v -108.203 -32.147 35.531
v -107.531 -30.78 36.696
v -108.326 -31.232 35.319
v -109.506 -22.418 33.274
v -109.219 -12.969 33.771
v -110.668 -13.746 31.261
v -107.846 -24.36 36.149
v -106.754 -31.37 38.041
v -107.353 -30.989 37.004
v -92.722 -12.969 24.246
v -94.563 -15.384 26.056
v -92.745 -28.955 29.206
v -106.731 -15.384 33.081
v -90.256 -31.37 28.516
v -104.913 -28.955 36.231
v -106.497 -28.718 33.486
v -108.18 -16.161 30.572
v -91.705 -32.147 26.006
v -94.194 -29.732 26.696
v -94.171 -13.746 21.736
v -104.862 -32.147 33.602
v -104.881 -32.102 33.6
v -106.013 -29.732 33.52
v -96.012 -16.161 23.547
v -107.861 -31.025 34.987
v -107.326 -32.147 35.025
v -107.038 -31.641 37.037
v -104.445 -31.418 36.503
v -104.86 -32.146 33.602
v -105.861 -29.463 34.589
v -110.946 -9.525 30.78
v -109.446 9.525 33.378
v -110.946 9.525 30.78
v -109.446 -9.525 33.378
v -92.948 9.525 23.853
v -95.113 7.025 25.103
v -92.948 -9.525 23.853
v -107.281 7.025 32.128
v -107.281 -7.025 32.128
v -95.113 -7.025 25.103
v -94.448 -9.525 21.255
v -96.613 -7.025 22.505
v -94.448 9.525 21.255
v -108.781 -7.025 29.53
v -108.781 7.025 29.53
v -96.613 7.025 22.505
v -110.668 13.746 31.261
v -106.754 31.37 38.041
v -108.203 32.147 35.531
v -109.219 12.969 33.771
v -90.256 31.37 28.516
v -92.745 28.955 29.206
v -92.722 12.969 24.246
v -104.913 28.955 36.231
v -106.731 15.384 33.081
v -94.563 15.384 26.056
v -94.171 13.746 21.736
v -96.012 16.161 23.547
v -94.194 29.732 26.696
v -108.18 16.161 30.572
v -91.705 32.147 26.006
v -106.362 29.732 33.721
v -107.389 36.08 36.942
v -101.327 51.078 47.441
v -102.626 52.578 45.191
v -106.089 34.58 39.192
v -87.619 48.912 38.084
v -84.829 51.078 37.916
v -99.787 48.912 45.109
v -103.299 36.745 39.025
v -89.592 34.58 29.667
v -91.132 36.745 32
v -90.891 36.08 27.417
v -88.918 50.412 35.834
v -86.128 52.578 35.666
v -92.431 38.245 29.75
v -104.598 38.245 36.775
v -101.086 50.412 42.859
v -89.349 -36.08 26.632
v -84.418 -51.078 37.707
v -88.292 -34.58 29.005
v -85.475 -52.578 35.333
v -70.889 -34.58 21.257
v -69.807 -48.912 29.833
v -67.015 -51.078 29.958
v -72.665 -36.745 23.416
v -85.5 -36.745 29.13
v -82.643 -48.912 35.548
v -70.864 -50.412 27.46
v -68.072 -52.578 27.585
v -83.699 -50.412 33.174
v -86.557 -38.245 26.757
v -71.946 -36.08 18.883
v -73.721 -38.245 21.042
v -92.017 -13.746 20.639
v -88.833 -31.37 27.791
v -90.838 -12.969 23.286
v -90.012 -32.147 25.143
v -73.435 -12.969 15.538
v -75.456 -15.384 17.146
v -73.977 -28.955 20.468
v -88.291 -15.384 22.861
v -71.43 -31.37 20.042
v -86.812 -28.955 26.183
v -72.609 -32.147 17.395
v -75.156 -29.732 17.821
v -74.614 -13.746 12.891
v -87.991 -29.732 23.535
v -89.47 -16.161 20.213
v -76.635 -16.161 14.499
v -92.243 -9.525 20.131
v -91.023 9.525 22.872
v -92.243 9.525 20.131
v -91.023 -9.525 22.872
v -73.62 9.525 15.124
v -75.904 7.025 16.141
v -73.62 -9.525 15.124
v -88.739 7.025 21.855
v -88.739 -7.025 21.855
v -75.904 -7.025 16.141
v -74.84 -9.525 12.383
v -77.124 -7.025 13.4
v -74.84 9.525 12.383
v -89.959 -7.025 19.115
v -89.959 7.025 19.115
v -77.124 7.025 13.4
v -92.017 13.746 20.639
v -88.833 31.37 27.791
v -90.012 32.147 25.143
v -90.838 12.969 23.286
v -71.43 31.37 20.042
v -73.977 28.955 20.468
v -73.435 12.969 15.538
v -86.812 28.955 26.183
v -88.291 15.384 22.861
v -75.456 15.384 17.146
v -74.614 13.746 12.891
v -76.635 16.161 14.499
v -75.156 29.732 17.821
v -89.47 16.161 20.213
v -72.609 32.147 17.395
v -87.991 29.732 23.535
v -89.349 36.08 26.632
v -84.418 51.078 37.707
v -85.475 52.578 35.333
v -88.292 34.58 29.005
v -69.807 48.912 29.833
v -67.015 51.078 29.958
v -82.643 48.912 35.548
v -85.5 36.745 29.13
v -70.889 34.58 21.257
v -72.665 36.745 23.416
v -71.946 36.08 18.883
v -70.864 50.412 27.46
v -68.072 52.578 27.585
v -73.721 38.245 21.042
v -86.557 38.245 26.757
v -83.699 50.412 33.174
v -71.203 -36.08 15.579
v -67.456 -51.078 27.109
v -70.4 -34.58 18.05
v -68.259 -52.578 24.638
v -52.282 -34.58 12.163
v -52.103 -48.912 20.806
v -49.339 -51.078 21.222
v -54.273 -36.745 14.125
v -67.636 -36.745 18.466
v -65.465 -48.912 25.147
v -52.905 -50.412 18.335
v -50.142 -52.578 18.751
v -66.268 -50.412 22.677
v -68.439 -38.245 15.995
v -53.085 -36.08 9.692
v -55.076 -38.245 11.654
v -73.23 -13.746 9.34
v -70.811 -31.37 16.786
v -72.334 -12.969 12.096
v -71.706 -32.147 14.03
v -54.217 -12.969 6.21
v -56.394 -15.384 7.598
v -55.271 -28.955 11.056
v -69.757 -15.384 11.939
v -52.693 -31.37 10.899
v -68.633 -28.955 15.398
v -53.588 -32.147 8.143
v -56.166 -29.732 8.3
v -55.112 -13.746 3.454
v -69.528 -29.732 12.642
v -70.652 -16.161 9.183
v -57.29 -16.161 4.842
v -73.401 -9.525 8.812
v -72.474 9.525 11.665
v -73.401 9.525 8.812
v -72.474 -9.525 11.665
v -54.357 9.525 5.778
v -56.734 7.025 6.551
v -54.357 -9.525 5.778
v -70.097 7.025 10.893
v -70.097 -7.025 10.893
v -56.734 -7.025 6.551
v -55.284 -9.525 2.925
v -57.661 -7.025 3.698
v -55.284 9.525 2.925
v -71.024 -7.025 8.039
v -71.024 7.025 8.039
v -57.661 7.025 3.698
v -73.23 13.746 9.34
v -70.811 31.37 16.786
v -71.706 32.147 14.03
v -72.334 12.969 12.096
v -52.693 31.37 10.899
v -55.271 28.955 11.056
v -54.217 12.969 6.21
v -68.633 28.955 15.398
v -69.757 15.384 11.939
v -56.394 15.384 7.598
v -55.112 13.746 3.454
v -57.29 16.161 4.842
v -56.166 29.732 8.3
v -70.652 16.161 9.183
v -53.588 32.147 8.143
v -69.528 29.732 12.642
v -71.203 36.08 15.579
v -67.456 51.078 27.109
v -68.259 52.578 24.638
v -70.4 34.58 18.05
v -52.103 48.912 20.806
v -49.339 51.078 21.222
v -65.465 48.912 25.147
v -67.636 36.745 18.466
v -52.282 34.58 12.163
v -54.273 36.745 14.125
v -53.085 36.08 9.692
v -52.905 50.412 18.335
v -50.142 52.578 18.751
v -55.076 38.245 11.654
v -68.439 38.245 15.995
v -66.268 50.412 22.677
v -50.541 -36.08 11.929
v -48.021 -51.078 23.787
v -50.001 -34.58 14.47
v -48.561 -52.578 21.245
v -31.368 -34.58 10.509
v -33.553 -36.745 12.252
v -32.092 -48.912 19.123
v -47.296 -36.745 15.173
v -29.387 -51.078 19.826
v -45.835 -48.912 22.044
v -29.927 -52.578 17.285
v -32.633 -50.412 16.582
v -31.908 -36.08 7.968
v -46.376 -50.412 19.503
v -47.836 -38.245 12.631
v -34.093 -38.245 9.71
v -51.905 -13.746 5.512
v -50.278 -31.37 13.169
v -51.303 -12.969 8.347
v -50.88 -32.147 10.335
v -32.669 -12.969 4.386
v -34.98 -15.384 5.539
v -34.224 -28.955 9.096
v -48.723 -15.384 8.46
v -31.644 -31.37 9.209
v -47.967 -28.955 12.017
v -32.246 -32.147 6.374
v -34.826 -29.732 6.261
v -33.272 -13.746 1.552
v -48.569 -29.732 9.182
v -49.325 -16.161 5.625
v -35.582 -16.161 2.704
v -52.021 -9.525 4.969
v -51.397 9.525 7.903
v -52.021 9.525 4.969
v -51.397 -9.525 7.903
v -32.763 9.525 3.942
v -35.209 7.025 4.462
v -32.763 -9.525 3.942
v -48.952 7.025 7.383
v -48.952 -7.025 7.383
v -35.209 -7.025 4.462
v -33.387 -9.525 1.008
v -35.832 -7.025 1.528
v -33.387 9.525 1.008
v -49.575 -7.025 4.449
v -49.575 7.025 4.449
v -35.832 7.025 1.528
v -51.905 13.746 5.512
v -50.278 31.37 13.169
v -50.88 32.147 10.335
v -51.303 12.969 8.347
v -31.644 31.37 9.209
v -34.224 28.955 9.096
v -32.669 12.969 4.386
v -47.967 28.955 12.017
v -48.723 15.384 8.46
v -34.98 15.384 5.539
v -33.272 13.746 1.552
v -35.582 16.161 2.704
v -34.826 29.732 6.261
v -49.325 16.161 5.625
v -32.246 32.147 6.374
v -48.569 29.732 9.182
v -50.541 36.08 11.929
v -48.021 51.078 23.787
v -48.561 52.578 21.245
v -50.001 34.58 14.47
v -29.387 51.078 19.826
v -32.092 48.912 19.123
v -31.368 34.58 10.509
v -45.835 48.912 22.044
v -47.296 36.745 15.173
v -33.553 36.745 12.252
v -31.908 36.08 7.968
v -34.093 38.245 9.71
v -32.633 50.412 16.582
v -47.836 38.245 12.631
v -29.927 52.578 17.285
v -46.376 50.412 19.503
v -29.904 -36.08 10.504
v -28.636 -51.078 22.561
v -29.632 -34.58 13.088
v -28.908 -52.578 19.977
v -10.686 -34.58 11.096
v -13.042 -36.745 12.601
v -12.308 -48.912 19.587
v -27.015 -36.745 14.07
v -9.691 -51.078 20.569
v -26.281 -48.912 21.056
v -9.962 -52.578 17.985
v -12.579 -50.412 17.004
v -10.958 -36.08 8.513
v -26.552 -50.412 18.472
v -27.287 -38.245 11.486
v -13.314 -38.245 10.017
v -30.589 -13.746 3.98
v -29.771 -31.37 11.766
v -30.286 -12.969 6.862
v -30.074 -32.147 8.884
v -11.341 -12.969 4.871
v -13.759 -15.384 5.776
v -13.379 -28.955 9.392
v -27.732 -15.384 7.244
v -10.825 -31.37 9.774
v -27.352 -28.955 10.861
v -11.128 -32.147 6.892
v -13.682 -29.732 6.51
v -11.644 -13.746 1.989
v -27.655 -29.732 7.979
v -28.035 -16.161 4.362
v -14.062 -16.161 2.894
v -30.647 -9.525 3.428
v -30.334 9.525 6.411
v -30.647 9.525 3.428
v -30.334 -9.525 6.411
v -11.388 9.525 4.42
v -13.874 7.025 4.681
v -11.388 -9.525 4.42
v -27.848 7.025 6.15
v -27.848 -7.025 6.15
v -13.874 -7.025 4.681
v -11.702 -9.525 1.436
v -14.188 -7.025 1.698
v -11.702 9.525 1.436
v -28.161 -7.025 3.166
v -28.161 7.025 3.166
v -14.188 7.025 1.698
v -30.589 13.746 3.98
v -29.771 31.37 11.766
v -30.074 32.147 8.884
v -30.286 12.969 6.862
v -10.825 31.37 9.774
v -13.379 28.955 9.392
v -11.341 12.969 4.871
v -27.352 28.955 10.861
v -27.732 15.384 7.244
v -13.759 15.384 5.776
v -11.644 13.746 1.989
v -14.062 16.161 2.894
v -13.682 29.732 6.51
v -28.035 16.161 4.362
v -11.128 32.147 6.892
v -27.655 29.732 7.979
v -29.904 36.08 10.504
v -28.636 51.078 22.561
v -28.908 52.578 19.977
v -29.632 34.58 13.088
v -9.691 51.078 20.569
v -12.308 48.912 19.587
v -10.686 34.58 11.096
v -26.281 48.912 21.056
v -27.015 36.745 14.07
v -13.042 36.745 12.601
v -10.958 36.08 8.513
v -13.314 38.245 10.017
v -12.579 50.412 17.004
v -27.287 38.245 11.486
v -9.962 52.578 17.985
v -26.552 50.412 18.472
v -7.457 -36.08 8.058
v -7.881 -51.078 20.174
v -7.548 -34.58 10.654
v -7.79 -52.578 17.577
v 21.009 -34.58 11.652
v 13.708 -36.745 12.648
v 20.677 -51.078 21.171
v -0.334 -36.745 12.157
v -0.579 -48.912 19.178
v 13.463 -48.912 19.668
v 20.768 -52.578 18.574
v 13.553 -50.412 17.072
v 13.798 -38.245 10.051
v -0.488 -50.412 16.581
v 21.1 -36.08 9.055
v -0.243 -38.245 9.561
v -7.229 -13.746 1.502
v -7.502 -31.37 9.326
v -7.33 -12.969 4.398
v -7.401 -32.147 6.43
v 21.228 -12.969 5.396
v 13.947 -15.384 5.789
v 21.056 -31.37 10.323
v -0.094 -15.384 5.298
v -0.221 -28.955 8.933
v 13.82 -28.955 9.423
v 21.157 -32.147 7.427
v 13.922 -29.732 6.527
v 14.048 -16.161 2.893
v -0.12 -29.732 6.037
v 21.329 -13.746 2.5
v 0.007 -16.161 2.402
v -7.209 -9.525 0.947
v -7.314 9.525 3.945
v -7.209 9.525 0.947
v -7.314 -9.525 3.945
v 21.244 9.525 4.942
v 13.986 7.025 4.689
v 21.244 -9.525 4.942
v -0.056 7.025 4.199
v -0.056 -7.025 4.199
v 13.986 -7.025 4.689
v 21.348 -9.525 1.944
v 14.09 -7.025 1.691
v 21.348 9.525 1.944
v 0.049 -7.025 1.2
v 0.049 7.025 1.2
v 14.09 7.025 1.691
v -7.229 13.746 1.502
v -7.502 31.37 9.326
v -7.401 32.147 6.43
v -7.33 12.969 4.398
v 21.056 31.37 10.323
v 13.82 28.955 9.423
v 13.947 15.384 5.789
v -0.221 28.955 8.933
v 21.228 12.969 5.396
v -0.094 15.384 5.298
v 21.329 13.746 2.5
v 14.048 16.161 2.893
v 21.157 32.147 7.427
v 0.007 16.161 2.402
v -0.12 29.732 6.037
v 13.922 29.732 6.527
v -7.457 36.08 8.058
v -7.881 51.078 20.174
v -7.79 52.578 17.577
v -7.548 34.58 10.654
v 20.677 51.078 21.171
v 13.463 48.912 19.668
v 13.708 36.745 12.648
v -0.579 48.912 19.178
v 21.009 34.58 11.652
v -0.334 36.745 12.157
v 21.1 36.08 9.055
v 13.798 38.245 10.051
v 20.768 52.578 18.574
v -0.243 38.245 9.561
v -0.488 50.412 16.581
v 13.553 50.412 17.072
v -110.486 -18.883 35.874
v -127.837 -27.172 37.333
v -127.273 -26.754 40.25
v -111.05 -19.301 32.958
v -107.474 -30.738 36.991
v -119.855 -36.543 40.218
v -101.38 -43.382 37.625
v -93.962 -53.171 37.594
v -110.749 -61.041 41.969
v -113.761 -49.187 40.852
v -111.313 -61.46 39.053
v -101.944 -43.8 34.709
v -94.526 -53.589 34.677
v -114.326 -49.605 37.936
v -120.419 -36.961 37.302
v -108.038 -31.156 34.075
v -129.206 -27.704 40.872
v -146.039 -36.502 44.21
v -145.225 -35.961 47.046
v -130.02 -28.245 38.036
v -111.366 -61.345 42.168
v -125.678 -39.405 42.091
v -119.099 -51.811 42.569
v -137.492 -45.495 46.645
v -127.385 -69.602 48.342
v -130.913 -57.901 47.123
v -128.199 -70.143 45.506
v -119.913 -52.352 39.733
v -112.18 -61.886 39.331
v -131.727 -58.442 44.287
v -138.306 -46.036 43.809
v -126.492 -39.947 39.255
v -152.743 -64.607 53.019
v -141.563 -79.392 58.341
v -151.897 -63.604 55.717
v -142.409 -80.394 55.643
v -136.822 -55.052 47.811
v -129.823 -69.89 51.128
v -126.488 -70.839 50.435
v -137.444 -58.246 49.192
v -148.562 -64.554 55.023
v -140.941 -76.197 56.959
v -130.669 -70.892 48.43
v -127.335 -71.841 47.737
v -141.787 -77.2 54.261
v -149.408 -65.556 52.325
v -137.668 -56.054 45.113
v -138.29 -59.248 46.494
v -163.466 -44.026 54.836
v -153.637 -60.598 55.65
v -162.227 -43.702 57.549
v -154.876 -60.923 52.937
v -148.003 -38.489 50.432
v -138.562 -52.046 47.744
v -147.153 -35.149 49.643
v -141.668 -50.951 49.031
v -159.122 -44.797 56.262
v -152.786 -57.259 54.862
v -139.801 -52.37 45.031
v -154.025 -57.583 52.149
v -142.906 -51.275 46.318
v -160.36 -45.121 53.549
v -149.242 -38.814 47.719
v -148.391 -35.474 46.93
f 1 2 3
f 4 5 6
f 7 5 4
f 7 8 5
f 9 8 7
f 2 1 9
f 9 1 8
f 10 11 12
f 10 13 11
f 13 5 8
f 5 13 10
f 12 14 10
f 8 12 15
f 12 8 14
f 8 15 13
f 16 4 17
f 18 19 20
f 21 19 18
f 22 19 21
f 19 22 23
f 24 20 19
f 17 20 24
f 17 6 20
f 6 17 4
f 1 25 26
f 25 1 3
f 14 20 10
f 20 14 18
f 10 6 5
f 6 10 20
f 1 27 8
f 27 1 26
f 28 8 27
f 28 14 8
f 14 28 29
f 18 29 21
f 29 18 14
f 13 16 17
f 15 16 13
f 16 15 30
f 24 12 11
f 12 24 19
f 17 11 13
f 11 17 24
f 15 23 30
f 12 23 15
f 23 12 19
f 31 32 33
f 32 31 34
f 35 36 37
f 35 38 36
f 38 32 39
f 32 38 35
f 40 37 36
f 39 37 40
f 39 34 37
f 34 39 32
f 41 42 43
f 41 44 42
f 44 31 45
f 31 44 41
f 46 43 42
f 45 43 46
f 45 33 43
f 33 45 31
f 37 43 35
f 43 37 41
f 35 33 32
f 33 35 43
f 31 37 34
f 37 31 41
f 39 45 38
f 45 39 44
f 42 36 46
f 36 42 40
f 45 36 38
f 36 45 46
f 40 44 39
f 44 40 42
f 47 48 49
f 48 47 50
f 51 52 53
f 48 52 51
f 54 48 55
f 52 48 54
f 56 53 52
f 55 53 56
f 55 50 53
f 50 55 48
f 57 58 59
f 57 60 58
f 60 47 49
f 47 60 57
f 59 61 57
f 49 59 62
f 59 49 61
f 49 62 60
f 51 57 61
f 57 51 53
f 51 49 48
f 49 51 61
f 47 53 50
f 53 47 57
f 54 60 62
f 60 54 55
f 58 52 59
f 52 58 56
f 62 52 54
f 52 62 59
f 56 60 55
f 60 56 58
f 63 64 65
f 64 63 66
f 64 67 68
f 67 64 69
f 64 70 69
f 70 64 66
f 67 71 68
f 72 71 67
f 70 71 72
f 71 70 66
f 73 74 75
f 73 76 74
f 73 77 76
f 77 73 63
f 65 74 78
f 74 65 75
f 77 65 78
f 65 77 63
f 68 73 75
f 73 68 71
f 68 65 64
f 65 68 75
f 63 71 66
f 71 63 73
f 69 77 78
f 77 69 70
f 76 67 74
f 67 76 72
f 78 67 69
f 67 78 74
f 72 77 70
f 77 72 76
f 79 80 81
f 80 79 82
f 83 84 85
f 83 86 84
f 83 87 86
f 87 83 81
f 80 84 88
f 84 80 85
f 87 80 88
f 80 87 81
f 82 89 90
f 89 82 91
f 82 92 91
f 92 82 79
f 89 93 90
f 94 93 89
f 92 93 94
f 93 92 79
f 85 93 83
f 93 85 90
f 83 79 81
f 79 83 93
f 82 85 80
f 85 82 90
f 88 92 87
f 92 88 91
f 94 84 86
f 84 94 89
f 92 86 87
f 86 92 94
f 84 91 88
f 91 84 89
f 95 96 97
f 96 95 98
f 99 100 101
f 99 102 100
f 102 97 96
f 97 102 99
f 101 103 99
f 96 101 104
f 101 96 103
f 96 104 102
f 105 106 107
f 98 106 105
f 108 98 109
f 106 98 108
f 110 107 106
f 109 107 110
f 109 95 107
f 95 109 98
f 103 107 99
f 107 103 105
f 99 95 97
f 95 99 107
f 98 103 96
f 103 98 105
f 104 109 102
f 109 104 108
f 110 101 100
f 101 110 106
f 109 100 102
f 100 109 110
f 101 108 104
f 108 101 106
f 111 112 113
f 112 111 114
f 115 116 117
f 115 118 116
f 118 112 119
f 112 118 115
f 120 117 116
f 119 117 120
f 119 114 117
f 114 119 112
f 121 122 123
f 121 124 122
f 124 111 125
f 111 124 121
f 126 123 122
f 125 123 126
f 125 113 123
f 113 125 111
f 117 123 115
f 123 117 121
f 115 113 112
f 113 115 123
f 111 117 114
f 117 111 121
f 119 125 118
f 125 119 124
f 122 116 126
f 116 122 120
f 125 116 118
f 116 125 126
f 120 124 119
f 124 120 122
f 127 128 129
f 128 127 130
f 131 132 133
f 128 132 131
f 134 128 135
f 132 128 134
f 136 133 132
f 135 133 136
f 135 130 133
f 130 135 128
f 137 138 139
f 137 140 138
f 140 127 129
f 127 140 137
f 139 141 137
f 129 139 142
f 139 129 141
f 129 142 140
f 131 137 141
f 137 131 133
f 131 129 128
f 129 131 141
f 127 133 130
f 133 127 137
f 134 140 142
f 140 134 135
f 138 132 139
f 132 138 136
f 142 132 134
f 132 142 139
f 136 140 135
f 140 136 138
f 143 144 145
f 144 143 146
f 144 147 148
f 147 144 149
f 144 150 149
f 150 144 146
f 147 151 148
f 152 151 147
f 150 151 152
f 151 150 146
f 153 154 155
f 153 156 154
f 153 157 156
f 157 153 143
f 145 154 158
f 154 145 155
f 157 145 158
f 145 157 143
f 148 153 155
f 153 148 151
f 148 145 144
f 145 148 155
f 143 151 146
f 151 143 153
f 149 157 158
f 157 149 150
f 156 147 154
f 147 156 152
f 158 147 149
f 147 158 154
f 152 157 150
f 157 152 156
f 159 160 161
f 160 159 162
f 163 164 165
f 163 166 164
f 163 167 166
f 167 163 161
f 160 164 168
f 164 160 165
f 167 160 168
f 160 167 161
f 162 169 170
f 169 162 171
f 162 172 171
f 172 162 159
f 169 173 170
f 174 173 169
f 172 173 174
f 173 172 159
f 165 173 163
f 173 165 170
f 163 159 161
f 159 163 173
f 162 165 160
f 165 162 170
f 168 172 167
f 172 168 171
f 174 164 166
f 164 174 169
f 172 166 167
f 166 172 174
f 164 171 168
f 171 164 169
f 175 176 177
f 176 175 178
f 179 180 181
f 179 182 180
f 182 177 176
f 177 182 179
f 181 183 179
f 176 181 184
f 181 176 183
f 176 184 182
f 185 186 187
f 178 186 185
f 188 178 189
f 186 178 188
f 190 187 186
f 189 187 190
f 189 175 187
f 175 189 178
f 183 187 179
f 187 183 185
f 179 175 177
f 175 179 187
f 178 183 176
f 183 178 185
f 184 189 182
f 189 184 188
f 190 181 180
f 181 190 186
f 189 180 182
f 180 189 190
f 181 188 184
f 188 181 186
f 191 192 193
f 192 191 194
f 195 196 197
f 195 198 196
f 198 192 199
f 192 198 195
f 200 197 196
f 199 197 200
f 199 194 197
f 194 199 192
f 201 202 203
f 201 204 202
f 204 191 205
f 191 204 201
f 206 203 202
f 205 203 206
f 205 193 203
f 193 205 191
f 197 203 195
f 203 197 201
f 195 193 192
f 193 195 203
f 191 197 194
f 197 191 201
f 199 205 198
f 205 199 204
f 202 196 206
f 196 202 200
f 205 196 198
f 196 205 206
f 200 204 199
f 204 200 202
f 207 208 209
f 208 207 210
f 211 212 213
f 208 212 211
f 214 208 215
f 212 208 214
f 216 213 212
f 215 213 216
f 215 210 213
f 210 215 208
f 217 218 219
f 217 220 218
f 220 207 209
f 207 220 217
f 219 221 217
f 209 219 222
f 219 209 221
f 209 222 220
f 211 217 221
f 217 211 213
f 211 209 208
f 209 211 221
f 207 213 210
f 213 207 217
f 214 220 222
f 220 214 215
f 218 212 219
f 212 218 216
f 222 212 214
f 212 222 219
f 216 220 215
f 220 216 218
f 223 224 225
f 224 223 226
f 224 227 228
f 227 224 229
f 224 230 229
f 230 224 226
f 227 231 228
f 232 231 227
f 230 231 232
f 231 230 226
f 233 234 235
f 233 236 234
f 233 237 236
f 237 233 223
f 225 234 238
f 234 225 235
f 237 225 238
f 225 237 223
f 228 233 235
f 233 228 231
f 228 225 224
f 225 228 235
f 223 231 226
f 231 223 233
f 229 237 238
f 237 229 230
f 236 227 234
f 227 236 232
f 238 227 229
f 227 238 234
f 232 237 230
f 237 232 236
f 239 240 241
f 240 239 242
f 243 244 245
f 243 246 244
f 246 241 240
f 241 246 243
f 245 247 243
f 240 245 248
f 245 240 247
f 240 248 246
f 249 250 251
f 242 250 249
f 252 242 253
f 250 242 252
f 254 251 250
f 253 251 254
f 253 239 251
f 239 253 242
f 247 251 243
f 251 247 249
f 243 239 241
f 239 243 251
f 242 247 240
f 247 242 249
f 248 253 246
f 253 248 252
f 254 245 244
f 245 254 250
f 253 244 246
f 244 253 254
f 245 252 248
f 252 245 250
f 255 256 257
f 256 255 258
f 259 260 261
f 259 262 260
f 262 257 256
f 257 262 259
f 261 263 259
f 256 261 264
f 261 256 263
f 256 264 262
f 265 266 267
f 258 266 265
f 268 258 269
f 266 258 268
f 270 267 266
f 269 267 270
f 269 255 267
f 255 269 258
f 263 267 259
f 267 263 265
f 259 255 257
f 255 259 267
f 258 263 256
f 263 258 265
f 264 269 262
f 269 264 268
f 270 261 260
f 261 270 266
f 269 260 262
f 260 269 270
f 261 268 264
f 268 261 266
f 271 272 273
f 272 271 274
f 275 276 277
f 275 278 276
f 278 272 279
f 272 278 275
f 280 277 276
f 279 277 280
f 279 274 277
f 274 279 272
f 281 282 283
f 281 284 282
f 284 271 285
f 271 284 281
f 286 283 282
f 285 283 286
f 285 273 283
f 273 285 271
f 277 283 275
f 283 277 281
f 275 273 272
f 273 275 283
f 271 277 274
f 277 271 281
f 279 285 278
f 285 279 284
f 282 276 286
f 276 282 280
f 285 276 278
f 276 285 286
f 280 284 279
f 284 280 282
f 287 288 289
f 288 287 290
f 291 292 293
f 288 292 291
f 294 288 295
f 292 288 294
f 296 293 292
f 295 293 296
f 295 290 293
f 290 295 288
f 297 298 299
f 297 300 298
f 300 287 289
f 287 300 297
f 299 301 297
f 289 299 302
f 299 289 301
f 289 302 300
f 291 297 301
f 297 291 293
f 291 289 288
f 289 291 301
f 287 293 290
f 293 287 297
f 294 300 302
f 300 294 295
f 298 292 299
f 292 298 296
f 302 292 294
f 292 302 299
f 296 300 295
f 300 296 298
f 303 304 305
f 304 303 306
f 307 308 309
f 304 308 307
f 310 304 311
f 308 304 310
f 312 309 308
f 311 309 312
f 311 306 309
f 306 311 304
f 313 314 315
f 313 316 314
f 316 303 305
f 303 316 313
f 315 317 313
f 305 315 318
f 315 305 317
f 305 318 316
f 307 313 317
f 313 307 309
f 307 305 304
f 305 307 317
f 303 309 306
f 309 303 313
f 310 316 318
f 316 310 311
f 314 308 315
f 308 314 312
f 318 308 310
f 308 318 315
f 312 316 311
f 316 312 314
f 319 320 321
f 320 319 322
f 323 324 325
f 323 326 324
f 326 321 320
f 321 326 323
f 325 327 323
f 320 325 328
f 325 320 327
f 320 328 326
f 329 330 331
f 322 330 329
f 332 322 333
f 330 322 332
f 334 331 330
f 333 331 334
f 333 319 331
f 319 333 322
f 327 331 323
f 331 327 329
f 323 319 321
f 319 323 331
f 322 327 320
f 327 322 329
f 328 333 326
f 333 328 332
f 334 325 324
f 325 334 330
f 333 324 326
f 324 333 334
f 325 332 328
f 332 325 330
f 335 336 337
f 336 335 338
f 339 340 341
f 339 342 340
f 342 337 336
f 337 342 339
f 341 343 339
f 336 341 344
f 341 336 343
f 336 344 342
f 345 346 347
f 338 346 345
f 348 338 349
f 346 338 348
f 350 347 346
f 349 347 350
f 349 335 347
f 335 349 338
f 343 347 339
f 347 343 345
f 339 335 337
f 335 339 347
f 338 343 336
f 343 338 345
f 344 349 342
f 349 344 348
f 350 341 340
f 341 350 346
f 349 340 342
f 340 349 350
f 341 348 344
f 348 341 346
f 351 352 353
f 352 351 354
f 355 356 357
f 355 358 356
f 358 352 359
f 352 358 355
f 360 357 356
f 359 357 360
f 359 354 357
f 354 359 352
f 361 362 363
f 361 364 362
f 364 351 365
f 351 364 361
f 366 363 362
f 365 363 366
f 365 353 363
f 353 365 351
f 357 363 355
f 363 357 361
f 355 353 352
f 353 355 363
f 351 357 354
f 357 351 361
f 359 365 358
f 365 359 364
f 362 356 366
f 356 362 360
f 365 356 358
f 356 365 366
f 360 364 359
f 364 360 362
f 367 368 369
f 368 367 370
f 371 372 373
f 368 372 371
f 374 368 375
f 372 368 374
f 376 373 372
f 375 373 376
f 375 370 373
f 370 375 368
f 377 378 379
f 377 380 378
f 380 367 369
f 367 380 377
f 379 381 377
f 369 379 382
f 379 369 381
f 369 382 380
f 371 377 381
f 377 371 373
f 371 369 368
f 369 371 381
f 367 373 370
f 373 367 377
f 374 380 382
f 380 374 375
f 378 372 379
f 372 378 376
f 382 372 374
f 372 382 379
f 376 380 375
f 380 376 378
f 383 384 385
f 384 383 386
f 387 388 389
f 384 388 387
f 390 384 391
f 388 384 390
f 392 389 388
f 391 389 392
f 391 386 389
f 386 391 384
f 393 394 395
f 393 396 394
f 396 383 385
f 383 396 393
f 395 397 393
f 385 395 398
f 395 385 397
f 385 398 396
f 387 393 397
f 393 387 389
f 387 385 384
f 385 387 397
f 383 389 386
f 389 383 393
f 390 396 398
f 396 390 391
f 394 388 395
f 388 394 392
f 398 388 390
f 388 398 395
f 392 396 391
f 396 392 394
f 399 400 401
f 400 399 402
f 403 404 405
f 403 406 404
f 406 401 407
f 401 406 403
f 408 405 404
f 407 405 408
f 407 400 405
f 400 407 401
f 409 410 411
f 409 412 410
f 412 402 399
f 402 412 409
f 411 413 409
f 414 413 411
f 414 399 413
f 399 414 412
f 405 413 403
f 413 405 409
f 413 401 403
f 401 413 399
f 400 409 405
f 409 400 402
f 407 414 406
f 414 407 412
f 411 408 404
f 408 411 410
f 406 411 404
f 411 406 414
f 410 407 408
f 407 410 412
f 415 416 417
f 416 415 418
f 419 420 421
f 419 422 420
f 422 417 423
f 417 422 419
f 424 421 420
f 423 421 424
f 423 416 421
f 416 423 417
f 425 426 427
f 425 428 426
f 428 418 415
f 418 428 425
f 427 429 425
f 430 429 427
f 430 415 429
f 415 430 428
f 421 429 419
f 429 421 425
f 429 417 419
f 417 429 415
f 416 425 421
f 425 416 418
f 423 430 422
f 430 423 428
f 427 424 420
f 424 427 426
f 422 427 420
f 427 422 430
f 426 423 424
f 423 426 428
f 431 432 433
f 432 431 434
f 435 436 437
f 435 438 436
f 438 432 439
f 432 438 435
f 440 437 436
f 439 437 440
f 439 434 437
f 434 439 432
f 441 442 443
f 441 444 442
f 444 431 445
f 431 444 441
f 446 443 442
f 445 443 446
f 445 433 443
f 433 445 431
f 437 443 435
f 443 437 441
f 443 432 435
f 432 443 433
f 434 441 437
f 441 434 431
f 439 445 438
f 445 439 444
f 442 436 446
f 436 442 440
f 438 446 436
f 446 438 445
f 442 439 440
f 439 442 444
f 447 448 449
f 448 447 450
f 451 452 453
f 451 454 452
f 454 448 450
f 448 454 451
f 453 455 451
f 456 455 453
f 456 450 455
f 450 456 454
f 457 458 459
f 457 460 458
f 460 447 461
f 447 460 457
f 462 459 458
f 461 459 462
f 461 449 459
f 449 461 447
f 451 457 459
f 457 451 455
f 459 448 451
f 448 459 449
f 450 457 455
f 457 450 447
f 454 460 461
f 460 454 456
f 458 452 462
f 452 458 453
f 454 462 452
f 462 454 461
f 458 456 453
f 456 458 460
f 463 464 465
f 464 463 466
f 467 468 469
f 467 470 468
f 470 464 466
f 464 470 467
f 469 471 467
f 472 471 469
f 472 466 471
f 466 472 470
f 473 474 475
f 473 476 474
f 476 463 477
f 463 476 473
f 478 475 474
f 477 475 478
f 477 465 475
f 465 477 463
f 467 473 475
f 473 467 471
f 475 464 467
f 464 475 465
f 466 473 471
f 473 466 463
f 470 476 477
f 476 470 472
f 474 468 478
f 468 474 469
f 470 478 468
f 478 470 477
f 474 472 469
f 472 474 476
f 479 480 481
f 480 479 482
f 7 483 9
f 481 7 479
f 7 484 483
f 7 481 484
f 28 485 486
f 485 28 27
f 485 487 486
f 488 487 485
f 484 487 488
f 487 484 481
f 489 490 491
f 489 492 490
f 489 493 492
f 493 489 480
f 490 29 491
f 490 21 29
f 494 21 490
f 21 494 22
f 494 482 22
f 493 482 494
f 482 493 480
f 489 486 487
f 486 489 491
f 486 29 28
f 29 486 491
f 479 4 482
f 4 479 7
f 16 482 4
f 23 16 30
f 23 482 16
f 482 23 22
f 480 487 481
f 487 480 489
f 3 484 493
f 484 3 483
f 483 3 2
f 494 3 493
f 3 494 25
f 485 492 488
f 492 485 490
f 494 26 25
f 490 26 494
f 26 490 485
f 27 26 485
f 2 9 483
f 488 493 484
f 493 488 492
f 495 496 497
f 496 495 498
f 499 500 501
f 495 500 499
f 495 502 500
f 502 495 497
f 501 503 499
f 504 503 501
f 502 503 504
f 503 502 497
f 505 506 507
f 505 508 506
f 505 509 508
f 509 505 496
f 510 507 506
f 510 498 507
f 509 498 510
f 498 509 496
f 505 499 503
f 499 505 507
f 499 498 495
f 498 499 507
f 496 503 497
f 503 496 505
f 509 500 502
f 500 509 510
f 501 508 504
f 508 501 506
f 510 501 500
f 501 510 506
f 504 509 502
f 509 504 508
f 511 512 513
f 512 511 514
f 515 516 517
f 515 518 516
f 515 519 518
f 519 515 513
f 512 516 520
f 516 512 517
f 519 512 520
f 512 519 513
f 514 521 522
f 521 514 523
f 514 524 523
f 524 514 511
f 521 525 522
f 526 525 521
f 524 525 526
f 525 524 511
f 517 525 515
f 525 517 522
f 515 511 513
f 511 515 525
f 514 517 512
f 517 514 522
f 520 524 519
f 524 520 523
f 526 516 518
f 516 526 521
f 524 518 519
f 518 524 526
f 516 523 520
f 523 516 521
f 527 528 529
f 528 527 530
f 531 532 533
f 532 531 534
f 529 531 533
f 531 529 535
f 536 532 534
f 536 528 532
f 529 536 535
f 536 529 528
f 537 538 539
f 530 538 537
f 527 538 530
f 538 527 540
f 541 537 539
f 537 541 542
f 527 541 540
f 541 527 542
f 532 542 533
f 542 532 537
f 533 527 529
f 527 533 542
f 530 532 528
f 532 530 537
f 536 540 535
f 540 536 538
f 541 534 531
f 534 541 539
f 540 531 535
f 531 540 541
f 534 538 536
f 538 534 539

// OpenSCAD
//this thing is a shitshow, I just want to say

// globals

right = true;
cols = 5;
rows = 4;

// constants
unit = 19.05;
// row rotation angle. determines how much each row rotates compared to the last
alpha = 15;
// column rotation angle. you guessed it
beta = 6;

// I assume, the height of a key
key_height = 12.5;
hole_height = 7;
plate_height = 5.75;

// these are measurements for the actual keyswitch plates - the squares we position to accept a keyswitch
keyswitch_height = 19;
keyswitch_width = 19;

pillar_height = hole_height + plate_height / 2;
pillar_depth = keyswitch_height;
pillar_width = keyswitch_width;

full_height = pillar_height + key_height;

row_radius = (pillar_depth / 2) / (sin(alpha / 2)) + full_height-8;
column_radius = (pillar_width / 2) / (sin(beta / 2)) + full_height;

// start key place

//array of column angle insets (extra z distance for each column)
column_insets = [
   0,
   0,
   -254/90,
   0,
  254/90,
  254/90,
  254/90,
  254/90,
  254/90
];

// multiple use functions

module row_placed_shape(row,row_radius){
    translate([0, 0, row_radius])
    rotate([alpha * (row), 0, 0])
    translate([0, 0, -row_radius])

    children();
}

module column_placed_shape(column, column_radius, column_inset){
  //column_angle = beta * (5 - column);
  column_angle = (beta * (column - 5) + (column == cols ? 2 : 0));

  translate([0, 0, column_radius])
  rotate([0, column_angle, 0])
  translate([0, 0, -column_radius])
  translate([0,0,column_inset])
  children();
}

module key_place(column, row){
  column_inset = column_insets[column];

  column_placed_shape(column, column_radius, column_inset){
    row_placed_shape(row - 2, row_radius){
        children();
    }
  }
}

//end key place

// bounding box. also helps shape the case
module limits(){
  difference(){
    cube([1000,1000,1000], center = true);
    children();
  }
}

module switch_cutout(units=1){
  difference(){
    cube([unit*units,unit,3], center = true);
    cube([14.05,14.05,14], center = true);
  }
}

module hand_array_plate(){
  for (column = [0 : cols]){
    for (row = [0 : rows]){
      key_place(column,row){
        if (column == cols){
          switch_cutout(1.5);
        } else if (!(column == 0 && row == 0)){
          switch_cutout(1);
        }
      }
    }
  }
}

module hand_array_base(){
  for (column = [0 : cols]){
    for (row = [0 : rows]){
      key_place(column,row){
        if (column == cols){
          switch_pillar(1.5);
        }
        else if (column != 0 || row != rows){
          switch_pillar(1);
        }
      }
    }
  }
}

//large pillar-like structure put underneath each switch to make a base
module switch_pillar(units=1, scle = 3, extrax = 2.95, extray = 5.75){
  z = 100;
  linear_extrude(height = z, scale = scle){
    unit = 19.05;
    square([(unit + extrax) * units,unit + extray], center = true);
  }
}

//end multiple use functions

//start total base

module clipped_hand_base(z){
  difference(){
    hand_array_base();
    translate([-27.5,0,-20]) limits(){
      difference(){
        cube([205,125,z], center = true);
        translate([40,0,0]) rotate([0,0,45]) translate([94,0,0]) cube([60,60,z], center = true);
      }
    };
  }
}

module thumb_array_plate(){
  translate([25,27,44]){
    rotate([20,15,-15]) {
      key_place(0, 0.5) {
        rotate([0,0,90]) switch_cutout(2);
      }

      key_place(-1, 0.5) {
        rotate([0,0,90])
        switch_cutout(2);
      }

      key_place(-2, 0) {
        switch_cutout(1);
      }

      key_place(-2, 1) {
        switch_cutout(1);
      }
    }
  }
}

module thumb_place(column, row){
  translate([0, 0, row_radius]) {
    rotate([alpha * row, 0, 0]){
      translate([0, 0, -row_radius]){
        translate([0, 0, column_radius]) {
          rotate([0, column * beta, 0]){
            translate([0, 0, -column_radius]){
              translate([keyswitch_width + 3, 0, 0]){
                rotate([-15, -15, -11.25]) {
                  translate([52, -45, 40]){
                    children();
                  }
                }
              }
            }
          }
        }
      }
    }
  }
}

// end total base

// actual functions
//TODO gonna have to break this guy out for each side
module cave_plate(){
  hand_array_plate();
  thumb_array_plate();
}

module trss_hole(){
  translate([-19 - 5,-45,0]) rotate([0,90,0]) {
    cylinder(d=7,h=100, $fn=24);
    translate([0,0,-2 +50]) cube([5,11,100], center = true);
  }
}

module usb_hole(){
  //translate([80,-30,0])
  //cube([10,10,5], center = true);
}

module total_base(){
  /* difference(){

    // get rid of base for now
    clipped_hand_base(60);
    translate([0,0,-1]){
      scale([.95,.91,1]){
        clipped_hand_base(62);
      }
    }

    trss_hole();
    usb_hole(); // uncomment on left side
  }

  difference(){
    scale([.95,.91,1]){
      clipped_hand_base(62);
    }
  } */
}

// end actual functions

// output

if (right) {
  mirror([1,0,0]) {
    cave_plate();
    total_base();
  }
} else {
  cave_plate();
  total_base();
}
